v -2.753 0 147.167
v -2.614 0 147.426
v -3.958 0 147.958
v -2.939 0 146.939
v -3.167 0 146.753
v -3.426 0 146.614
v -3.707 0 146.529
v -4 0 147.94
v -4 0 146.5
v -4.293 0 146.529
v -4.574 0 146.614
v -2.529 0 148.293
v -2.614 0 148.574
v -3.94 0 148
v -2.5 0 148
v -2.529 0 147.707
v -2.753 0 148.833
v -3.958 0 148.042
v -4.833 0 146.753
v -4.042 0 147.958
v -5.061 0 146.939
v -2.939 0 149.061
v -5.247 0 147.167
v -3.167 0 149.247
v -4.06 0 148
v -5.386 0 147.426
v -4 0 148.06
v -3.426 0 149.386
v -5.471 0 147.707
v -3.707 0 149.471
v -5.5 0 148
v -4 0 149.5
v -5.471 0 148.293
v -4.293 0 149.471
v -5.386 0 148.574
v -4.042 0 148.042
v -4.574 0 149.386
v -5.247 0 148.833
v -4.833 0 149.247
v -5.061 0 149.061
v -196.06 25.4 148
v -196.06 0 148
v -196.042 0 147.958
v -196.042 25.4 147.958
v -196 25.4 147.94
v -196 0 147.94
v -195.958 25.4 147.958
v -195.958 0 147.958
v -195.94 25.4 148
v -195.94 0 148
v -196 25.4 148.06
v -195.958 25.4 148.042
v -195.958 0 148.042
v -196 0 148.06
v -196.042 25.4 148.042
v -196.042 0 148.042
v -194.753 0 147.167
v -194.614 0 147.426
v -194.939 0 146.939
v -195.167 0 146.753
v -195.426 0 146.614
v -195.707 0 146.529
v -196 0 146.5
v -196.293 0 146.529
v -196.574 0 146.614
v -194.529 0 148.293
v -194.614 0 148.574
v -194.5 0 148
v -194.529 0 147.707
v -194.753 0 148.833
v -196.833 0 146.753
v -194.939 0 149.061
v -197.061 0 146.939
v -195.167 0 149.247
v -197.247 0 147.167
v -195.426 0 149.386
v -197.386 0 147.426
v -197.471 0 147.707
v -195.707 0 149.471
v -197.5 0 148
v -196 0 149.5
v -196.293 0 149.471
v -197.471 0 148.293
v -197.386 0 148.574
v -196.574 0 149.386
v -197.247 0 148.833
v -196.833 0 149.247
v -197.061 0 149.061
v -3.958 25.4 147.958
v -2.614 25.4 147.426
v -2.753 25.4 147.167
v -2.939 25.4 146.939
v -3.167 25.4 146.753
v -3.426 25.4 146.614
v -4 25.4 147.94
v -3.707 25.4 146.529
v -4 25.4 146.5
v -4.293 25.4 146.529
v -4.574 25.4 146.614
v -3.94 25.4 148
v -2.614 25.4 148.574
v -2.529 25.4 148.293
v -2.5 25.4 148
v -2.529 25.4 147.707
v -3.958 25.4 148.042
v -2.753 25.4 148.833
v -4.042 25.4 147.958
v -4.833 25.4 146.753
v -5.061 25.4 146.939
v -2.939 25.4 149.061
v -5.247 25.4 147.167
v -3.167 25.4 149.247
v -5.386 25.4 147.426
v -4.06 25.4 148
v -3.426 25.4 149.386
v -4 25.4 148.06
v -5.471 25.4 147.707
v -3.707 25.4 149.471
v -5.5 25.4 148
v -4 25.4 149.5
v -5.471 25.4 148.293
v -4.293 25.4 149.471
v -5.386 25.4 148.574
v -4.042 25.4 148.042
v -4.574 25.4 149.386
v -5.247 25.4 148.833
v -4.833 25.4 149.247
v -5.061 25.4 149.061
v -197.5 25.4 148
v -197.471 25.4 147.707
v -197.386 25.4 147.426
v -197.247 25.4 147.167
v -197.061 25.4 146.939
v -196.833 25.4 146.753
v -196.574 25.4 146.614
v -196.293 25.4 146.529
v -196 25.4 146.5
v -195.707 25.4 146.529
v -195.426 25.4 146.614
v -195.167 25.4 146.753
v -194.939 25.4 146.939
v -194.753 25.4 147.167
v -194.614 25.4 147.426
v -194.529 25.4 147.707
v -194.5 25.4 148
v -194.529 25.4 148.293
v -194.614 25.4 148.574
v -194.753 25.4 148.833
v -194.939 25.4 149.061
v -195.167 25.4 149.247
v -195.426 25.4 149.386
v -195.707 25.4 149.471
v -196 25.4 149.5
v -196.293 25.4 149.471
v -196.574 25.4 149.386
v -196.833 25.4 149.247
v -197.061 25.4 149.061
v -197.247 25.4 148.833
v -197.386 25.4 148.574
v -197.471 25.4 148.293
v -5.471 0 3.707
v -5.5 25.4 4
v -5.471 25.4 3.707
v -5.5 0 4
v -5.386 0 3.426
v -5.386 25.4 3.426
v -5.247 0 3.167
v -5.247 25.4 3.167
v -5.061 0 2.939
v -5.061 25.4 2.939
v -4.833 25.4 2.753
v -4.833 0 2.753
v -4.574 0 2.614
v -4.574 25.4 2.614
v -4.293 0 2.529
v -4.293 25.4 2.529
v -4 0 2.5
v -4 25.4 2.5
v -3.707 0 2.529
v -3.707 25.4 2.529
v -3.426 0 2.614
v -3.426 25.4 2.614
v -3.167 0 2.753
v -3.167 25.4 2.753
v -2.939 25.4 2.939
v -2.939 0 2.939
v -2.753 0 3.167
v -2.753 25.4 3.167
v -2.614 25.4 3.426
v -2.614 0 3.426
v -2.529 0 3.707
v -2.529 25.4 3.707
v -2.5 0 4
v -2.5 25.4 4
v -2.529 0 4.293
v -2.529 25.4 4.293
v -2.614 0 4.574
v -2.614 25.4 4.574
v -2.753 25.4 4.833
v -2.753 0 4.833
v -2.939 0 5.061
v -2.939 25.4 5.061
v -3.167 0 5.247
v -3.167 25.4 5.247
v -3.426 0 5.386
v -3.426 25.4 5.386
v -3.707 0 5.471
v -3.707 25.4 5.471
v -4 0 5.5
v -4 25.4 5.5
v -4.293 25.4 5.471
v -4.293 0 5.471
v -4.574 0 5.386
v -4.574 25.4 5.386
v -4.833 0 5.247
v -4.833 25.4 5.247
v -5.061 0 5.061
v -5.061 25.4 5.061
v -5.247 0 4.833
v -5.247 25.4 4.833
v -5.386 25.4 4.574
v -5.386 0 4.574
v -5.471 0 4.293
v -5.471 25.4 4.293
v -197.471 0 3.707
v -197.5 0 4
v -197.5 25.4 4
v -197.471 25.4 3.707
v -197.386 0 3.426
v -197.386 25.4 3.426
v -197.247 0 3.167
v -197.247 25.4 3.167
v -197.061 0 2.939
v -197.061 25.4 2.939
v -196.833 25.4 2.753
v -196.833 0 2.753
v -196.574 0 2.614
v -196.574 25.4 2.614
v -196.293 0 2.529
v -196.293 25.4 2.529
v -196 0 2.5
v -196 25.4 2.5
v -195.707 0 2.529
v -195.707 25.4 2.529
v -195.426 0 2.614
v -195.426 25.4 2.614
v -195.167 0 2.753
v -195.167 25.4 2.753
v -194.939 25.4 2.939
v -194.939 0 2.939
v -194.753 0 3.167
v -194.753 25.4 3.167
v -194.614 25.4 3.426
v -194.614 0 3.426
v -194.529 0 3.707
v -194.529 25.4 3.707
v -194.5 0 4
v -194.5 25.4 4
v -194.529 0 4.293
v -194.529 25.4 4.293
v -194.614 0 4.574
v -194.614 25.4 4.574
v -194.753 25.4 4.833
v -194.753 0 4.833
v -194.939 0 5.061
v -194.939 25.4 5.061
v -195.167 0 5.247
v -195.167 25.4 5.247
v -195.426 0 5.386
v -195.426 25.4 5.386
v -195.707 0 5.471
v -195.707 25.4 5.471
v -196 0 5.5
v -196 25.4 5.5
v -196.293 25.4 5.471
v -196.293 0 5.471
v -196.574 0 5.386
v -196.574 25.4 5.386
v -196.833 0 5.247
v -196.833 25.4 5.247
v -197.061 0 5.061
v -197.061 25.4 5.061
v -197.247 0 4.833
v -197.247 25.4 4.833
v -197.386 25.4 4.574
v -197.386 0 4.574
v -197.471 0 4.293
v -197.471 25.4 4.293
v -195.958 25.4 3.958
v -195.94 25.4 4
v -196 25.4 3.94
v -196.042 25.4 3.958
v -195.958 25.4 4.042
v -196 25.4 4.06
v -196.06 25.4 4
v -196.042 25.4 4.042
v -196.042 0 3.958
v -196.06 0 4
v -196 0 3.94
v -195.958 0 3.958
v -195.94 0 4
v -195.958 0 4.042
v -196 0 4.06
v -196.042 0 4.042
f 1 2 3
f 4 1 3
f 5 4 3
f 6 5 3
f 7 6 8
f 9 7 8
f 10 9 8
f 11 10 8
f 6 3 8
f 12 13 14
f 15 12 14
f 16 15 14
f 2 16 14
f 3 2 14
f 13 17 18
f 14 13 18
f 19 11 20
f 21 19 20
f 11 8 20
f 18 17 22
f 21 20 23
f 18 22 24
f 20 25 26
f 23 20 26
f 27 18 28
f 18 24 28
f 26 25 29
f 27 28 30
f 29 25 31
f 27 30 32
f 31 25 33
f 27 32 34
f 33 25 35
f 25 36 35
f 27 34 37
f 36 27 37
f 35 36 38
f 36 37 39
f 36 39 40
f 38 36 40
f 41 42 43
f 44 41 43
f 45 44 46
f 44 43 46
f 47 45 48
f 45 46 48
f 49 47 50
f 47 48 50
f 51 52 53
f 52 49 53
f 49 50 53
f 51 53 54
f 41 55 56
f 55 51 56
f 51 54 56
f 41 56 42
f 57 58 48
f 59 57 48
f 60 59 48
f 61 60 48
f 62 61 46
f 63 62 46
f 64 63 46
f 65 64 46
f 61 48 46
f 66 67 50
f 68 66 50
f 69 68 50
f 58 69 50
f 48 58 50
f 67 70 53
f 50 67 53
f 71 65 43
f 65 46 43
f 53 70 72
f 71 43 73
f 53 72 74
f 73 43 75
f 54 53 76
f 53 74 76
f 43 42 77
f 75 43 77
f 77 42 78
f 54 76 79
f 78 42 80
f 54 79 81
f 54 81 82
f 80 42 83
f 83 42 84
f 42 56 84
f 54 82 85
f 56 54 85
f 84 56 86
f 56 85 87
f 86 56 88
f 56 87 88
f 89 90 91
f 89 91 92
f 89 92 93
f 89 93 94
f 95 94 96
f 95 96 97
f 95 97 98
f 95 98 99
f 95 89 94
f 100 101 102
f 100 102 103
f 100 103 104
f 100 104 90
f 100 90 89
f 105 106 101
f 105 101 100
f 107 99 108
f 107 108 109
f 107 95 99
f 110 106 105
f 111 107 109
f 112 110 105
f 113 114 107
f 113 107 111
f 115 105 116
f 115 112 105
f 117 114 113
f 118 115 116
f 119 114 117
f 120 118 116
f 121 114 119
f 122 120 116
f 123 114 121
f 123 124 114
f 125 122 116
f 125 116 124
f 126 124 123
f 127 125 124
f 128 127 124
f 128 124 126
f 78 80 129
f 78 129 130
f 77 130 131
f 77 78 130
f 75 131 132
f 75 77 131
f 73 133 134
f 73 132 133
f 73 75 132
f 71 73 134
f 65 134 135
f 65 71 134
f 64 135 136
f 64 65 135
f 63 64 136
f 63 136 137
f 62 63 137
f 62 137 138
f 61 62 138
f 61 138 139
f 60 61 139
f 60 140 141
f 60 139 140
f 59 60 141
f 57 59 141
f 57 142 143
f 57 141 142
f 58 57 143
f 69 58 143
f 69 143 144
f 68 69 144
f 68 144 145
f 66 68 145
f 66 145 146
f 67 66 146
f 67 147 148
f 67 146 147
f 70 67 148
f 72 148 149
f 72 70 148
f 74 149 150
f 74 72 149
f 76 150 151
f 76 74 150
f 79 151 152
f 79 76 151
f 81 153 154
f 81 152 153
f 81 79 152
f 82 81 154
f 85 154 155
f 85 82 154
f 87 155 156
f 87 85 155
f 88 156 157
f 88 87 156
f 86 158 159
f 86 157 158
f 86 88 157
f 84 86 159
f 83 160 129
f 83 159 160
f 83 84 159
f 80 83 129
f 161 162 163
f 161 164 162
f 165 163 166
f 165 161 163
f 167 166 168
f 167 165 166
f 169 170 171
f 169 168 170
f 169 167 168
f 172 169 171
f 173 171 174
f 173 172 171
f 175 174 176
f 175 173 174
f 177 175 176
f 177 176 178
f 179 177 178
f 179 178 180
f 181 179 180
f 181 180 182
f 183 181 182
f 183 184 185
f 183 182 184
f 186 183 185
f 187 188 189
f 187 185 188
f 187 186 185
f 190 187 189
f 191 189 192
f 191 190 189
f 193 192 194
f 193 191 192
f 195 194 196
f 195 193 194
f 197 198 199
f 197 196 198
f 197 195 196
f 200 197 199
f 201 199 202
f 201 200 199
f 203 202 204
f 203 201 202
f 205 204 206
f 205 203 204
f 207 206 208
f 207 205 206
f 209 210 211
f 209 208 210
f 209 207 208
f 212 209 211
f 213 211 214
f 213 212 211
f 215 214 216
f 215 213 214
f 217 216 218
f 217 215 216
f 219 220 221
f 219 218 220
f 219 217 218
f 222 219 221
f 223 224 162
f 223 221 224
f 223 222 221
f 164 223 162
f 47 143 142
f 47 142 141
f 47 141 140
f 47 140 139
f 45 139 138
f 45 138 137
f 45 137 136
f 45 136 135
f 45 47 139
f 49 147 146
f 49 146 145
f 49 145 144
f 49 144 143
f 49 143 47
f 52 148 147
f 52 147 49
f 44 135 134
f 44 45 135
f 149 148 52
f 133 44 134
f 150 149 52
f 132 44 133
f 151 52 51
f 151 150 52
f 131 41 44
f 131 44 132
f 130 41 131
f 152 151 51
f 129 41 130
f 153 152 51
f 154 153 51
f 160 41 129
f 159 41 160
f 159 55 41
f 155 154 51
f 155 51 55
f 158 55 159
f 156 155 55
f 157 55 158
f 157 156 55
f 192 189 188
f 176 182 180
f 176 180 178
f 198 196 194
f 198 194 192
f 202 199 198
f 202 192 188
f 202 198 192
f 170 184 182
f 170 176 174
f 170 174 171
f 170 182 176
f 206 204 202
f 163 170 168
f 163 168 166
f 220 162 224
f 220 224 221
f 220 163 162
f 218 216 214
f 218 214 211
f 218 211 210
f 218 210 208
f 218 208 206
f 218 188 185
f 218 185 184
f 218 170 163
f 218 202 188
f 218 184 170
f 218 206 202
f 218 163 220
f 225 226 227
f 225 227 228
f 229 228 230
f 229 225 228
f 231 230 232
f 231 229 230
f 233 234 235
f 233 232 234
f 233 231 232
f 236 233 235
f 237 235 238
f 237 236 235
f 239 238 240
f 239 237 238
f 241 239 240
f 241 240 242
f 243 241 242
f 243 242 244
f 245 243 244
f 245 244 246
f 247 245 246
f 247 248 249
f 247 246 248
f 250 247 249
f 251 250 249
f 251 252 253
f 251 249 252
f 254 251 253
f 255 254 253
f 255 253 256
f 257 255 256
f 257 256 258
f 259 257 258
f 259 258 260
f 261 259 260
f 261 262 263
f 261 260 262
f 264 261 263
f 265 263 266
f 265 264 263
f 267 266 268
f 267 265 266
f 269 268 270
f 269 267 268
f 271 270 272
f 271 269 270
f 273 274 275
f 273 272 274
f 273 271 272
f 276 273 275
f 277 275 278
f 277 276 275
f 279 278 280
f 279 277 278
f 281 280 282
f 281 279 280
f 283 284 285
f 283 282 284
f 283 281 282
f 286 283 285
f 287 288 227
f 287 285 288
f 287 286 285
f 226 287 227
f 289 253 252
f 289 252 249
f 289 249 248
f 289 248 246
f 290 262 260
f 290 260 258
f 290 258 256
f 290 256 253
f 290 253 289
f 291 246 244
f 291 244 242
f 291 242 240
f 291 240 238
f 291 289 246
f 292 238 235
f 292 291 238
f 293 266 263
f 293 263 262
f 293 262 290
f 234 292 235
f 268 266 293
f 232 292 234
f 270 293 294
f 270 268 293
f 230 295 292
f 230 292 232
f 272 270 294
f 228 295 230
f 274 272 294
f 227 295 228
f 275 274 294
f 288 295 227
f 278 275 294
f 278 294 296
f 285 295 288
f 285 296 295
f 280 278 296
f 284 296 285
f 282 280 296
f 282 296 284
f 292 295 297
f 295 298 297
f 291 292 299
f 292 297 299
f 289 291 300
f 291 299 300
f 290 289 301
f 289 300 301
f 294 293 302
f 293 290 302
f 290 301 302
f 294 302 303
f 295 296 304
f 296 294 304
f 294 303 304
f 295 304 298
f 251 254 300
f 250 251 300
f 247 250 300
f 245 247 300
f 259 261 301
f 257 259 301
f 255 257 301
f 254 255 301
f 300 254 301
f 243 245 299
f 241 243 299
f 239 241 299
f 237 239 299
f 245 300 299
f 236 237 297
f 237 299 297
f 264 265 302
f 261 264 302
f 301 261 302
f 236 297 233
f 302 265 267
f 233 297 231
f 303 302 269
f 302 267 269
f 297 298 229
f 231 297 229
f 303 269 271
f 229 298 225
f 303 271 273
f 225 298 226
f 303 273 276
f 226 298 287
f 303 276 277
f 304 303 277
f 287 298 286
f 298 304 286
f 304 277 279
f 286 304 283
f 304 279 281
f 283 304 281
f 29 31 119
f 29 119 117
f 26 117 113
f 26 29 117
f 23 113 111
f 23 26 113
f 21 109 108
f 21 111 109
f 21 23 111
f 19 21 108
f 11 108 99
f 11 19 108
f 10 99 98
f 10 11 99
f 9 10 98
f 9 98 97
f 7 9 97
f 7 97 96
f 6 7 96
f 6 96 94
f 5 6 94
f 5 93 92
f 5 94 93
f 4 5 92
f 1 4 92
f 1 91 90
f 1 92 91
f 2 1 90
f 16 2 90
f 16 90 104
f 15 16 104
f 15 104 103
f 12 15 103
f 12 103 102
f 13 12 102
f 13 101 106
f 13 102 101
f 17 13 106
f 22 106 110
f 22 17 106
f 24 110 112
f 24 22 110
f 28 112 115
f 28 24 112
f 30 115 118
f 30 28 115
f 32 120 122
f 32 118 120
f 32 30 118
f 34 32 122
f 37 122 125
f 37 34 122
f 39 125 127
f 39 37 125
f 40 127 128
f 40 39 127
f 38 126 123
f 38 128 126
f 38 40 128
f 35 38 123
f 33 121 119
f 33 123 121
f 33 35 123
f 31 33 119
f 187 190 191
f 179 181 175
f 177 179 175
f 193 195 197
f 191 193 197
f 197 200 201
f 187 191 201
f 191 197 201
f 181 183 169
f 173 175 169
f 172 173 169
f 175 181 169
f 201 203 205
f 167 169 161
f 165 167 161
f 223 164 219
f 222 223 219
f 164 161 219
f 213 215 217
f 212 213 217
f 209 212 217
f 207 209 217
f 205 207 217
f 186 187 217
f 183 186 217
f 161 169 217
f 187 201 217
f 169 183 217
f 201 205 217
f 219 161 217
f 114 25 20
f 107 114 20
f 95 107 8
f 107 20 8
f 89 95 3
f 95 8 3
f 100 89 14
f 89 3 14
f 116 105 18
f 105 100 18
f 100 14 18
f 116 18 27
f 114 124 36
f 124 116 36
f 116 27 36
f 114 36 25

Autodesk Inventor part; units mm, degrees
ref_plane "YZ Plane" through (0, 0, 0) normal (1, 0, 0) x (0, 1, 0)
ref_plane "XZ Plane" through (0, 0, 0) normal (0, 1, 0) x (-1, 0, 0)
ref_plane "XY Plane" through (0, 0, 0) normal (0, 0, 1) x (1, 0, 0)
sketch "Sketch1" plane through (0, 0, 0) normal (0, 1, 0) x (-1, 0, 0)
  line L0 (0, 0) -> (200, 0)
  line L1 (200, 0) -> (200, 152)
  line L2 (200, 152) -> (0, 152)
  line L3 (0, 152) -> (0, 0)
  circle A0 centre (4, 4) radius 0.06
  circle A1 centre (196, 148) radius 0.06
  circle A2 centre (4, 148) radius 0.06
  circle A3 centre (196, 4) radius 0.06
  circle A4 centre (4, 148) radius 1.5
  circle A5 centre (4, 4) radius 1.5
  circle A6 centre (196, 4) radius 1.5
  circle A7 centre (196, 148) radius 1.5
  arc A8 (4, 3.9192) -> (4, 4.0808) centre (4, 4) ccw
  arc A9 (4, 4.0808) -> (4, 3.9192) centre (4, 4) ccw
  arc A10 (196, 147.9192) -> (196, 148.0808) centre (196, 148) ccw
  arc A11 (196, 148.0808) -> (196, 147.9192) centre (196, 148) ccw
  arc A12 (4, 147.9192) -> (4, 148.0808) centre (4, 148) ccw
  arc A13 (4, 148.0808) -> (4, 147.9192) centre (4, 148) ccw
  arc A14 (196, 3.9192) -> (196, 4.0808) centre (196, 4) ccw
  arc A15 (196, 4.0808) -> (196, 3.9192) centre (196, 4) ccw
  arc A16 (4, 147.1992) -> (4, 148.8008) centre (4, 148) ccw
  arc A17 (4, 148.8008) -> (4, 147.1992) centre (4, 148) ccw
  arc A18 (4, 3.1992) -> (4, 4.8008) centre (4, 4) ccw
  arc A19 (4, 4.8008) -> (4, 3.1992) centre (4, 4) ccw
  arc A20 (196, 3.1992) -> (196, 4.8008) centre (196, 4) ccw
  arc A21 (196, 4.8008) -> (196, 3.1992) centre (196, 4) ccw
  arc A22 (196, 147.1992) -> (196, 148.8008) centre (196, 148) ccw
  arc A23 (196, 148.8008) -> (196, 147.1992) centre (196, 148) ccw
extrude "Extrusion1" add sketch "Sketch1" along normal blind 25.4 contours A0 | A4 | A5 | A6 | A7 | A9 A8 | A11 A10 | A13 A12 | A15 A14 | A17 A16 | A19 A18 | A21 A20 | A23 A22
properties part number "ALU"
